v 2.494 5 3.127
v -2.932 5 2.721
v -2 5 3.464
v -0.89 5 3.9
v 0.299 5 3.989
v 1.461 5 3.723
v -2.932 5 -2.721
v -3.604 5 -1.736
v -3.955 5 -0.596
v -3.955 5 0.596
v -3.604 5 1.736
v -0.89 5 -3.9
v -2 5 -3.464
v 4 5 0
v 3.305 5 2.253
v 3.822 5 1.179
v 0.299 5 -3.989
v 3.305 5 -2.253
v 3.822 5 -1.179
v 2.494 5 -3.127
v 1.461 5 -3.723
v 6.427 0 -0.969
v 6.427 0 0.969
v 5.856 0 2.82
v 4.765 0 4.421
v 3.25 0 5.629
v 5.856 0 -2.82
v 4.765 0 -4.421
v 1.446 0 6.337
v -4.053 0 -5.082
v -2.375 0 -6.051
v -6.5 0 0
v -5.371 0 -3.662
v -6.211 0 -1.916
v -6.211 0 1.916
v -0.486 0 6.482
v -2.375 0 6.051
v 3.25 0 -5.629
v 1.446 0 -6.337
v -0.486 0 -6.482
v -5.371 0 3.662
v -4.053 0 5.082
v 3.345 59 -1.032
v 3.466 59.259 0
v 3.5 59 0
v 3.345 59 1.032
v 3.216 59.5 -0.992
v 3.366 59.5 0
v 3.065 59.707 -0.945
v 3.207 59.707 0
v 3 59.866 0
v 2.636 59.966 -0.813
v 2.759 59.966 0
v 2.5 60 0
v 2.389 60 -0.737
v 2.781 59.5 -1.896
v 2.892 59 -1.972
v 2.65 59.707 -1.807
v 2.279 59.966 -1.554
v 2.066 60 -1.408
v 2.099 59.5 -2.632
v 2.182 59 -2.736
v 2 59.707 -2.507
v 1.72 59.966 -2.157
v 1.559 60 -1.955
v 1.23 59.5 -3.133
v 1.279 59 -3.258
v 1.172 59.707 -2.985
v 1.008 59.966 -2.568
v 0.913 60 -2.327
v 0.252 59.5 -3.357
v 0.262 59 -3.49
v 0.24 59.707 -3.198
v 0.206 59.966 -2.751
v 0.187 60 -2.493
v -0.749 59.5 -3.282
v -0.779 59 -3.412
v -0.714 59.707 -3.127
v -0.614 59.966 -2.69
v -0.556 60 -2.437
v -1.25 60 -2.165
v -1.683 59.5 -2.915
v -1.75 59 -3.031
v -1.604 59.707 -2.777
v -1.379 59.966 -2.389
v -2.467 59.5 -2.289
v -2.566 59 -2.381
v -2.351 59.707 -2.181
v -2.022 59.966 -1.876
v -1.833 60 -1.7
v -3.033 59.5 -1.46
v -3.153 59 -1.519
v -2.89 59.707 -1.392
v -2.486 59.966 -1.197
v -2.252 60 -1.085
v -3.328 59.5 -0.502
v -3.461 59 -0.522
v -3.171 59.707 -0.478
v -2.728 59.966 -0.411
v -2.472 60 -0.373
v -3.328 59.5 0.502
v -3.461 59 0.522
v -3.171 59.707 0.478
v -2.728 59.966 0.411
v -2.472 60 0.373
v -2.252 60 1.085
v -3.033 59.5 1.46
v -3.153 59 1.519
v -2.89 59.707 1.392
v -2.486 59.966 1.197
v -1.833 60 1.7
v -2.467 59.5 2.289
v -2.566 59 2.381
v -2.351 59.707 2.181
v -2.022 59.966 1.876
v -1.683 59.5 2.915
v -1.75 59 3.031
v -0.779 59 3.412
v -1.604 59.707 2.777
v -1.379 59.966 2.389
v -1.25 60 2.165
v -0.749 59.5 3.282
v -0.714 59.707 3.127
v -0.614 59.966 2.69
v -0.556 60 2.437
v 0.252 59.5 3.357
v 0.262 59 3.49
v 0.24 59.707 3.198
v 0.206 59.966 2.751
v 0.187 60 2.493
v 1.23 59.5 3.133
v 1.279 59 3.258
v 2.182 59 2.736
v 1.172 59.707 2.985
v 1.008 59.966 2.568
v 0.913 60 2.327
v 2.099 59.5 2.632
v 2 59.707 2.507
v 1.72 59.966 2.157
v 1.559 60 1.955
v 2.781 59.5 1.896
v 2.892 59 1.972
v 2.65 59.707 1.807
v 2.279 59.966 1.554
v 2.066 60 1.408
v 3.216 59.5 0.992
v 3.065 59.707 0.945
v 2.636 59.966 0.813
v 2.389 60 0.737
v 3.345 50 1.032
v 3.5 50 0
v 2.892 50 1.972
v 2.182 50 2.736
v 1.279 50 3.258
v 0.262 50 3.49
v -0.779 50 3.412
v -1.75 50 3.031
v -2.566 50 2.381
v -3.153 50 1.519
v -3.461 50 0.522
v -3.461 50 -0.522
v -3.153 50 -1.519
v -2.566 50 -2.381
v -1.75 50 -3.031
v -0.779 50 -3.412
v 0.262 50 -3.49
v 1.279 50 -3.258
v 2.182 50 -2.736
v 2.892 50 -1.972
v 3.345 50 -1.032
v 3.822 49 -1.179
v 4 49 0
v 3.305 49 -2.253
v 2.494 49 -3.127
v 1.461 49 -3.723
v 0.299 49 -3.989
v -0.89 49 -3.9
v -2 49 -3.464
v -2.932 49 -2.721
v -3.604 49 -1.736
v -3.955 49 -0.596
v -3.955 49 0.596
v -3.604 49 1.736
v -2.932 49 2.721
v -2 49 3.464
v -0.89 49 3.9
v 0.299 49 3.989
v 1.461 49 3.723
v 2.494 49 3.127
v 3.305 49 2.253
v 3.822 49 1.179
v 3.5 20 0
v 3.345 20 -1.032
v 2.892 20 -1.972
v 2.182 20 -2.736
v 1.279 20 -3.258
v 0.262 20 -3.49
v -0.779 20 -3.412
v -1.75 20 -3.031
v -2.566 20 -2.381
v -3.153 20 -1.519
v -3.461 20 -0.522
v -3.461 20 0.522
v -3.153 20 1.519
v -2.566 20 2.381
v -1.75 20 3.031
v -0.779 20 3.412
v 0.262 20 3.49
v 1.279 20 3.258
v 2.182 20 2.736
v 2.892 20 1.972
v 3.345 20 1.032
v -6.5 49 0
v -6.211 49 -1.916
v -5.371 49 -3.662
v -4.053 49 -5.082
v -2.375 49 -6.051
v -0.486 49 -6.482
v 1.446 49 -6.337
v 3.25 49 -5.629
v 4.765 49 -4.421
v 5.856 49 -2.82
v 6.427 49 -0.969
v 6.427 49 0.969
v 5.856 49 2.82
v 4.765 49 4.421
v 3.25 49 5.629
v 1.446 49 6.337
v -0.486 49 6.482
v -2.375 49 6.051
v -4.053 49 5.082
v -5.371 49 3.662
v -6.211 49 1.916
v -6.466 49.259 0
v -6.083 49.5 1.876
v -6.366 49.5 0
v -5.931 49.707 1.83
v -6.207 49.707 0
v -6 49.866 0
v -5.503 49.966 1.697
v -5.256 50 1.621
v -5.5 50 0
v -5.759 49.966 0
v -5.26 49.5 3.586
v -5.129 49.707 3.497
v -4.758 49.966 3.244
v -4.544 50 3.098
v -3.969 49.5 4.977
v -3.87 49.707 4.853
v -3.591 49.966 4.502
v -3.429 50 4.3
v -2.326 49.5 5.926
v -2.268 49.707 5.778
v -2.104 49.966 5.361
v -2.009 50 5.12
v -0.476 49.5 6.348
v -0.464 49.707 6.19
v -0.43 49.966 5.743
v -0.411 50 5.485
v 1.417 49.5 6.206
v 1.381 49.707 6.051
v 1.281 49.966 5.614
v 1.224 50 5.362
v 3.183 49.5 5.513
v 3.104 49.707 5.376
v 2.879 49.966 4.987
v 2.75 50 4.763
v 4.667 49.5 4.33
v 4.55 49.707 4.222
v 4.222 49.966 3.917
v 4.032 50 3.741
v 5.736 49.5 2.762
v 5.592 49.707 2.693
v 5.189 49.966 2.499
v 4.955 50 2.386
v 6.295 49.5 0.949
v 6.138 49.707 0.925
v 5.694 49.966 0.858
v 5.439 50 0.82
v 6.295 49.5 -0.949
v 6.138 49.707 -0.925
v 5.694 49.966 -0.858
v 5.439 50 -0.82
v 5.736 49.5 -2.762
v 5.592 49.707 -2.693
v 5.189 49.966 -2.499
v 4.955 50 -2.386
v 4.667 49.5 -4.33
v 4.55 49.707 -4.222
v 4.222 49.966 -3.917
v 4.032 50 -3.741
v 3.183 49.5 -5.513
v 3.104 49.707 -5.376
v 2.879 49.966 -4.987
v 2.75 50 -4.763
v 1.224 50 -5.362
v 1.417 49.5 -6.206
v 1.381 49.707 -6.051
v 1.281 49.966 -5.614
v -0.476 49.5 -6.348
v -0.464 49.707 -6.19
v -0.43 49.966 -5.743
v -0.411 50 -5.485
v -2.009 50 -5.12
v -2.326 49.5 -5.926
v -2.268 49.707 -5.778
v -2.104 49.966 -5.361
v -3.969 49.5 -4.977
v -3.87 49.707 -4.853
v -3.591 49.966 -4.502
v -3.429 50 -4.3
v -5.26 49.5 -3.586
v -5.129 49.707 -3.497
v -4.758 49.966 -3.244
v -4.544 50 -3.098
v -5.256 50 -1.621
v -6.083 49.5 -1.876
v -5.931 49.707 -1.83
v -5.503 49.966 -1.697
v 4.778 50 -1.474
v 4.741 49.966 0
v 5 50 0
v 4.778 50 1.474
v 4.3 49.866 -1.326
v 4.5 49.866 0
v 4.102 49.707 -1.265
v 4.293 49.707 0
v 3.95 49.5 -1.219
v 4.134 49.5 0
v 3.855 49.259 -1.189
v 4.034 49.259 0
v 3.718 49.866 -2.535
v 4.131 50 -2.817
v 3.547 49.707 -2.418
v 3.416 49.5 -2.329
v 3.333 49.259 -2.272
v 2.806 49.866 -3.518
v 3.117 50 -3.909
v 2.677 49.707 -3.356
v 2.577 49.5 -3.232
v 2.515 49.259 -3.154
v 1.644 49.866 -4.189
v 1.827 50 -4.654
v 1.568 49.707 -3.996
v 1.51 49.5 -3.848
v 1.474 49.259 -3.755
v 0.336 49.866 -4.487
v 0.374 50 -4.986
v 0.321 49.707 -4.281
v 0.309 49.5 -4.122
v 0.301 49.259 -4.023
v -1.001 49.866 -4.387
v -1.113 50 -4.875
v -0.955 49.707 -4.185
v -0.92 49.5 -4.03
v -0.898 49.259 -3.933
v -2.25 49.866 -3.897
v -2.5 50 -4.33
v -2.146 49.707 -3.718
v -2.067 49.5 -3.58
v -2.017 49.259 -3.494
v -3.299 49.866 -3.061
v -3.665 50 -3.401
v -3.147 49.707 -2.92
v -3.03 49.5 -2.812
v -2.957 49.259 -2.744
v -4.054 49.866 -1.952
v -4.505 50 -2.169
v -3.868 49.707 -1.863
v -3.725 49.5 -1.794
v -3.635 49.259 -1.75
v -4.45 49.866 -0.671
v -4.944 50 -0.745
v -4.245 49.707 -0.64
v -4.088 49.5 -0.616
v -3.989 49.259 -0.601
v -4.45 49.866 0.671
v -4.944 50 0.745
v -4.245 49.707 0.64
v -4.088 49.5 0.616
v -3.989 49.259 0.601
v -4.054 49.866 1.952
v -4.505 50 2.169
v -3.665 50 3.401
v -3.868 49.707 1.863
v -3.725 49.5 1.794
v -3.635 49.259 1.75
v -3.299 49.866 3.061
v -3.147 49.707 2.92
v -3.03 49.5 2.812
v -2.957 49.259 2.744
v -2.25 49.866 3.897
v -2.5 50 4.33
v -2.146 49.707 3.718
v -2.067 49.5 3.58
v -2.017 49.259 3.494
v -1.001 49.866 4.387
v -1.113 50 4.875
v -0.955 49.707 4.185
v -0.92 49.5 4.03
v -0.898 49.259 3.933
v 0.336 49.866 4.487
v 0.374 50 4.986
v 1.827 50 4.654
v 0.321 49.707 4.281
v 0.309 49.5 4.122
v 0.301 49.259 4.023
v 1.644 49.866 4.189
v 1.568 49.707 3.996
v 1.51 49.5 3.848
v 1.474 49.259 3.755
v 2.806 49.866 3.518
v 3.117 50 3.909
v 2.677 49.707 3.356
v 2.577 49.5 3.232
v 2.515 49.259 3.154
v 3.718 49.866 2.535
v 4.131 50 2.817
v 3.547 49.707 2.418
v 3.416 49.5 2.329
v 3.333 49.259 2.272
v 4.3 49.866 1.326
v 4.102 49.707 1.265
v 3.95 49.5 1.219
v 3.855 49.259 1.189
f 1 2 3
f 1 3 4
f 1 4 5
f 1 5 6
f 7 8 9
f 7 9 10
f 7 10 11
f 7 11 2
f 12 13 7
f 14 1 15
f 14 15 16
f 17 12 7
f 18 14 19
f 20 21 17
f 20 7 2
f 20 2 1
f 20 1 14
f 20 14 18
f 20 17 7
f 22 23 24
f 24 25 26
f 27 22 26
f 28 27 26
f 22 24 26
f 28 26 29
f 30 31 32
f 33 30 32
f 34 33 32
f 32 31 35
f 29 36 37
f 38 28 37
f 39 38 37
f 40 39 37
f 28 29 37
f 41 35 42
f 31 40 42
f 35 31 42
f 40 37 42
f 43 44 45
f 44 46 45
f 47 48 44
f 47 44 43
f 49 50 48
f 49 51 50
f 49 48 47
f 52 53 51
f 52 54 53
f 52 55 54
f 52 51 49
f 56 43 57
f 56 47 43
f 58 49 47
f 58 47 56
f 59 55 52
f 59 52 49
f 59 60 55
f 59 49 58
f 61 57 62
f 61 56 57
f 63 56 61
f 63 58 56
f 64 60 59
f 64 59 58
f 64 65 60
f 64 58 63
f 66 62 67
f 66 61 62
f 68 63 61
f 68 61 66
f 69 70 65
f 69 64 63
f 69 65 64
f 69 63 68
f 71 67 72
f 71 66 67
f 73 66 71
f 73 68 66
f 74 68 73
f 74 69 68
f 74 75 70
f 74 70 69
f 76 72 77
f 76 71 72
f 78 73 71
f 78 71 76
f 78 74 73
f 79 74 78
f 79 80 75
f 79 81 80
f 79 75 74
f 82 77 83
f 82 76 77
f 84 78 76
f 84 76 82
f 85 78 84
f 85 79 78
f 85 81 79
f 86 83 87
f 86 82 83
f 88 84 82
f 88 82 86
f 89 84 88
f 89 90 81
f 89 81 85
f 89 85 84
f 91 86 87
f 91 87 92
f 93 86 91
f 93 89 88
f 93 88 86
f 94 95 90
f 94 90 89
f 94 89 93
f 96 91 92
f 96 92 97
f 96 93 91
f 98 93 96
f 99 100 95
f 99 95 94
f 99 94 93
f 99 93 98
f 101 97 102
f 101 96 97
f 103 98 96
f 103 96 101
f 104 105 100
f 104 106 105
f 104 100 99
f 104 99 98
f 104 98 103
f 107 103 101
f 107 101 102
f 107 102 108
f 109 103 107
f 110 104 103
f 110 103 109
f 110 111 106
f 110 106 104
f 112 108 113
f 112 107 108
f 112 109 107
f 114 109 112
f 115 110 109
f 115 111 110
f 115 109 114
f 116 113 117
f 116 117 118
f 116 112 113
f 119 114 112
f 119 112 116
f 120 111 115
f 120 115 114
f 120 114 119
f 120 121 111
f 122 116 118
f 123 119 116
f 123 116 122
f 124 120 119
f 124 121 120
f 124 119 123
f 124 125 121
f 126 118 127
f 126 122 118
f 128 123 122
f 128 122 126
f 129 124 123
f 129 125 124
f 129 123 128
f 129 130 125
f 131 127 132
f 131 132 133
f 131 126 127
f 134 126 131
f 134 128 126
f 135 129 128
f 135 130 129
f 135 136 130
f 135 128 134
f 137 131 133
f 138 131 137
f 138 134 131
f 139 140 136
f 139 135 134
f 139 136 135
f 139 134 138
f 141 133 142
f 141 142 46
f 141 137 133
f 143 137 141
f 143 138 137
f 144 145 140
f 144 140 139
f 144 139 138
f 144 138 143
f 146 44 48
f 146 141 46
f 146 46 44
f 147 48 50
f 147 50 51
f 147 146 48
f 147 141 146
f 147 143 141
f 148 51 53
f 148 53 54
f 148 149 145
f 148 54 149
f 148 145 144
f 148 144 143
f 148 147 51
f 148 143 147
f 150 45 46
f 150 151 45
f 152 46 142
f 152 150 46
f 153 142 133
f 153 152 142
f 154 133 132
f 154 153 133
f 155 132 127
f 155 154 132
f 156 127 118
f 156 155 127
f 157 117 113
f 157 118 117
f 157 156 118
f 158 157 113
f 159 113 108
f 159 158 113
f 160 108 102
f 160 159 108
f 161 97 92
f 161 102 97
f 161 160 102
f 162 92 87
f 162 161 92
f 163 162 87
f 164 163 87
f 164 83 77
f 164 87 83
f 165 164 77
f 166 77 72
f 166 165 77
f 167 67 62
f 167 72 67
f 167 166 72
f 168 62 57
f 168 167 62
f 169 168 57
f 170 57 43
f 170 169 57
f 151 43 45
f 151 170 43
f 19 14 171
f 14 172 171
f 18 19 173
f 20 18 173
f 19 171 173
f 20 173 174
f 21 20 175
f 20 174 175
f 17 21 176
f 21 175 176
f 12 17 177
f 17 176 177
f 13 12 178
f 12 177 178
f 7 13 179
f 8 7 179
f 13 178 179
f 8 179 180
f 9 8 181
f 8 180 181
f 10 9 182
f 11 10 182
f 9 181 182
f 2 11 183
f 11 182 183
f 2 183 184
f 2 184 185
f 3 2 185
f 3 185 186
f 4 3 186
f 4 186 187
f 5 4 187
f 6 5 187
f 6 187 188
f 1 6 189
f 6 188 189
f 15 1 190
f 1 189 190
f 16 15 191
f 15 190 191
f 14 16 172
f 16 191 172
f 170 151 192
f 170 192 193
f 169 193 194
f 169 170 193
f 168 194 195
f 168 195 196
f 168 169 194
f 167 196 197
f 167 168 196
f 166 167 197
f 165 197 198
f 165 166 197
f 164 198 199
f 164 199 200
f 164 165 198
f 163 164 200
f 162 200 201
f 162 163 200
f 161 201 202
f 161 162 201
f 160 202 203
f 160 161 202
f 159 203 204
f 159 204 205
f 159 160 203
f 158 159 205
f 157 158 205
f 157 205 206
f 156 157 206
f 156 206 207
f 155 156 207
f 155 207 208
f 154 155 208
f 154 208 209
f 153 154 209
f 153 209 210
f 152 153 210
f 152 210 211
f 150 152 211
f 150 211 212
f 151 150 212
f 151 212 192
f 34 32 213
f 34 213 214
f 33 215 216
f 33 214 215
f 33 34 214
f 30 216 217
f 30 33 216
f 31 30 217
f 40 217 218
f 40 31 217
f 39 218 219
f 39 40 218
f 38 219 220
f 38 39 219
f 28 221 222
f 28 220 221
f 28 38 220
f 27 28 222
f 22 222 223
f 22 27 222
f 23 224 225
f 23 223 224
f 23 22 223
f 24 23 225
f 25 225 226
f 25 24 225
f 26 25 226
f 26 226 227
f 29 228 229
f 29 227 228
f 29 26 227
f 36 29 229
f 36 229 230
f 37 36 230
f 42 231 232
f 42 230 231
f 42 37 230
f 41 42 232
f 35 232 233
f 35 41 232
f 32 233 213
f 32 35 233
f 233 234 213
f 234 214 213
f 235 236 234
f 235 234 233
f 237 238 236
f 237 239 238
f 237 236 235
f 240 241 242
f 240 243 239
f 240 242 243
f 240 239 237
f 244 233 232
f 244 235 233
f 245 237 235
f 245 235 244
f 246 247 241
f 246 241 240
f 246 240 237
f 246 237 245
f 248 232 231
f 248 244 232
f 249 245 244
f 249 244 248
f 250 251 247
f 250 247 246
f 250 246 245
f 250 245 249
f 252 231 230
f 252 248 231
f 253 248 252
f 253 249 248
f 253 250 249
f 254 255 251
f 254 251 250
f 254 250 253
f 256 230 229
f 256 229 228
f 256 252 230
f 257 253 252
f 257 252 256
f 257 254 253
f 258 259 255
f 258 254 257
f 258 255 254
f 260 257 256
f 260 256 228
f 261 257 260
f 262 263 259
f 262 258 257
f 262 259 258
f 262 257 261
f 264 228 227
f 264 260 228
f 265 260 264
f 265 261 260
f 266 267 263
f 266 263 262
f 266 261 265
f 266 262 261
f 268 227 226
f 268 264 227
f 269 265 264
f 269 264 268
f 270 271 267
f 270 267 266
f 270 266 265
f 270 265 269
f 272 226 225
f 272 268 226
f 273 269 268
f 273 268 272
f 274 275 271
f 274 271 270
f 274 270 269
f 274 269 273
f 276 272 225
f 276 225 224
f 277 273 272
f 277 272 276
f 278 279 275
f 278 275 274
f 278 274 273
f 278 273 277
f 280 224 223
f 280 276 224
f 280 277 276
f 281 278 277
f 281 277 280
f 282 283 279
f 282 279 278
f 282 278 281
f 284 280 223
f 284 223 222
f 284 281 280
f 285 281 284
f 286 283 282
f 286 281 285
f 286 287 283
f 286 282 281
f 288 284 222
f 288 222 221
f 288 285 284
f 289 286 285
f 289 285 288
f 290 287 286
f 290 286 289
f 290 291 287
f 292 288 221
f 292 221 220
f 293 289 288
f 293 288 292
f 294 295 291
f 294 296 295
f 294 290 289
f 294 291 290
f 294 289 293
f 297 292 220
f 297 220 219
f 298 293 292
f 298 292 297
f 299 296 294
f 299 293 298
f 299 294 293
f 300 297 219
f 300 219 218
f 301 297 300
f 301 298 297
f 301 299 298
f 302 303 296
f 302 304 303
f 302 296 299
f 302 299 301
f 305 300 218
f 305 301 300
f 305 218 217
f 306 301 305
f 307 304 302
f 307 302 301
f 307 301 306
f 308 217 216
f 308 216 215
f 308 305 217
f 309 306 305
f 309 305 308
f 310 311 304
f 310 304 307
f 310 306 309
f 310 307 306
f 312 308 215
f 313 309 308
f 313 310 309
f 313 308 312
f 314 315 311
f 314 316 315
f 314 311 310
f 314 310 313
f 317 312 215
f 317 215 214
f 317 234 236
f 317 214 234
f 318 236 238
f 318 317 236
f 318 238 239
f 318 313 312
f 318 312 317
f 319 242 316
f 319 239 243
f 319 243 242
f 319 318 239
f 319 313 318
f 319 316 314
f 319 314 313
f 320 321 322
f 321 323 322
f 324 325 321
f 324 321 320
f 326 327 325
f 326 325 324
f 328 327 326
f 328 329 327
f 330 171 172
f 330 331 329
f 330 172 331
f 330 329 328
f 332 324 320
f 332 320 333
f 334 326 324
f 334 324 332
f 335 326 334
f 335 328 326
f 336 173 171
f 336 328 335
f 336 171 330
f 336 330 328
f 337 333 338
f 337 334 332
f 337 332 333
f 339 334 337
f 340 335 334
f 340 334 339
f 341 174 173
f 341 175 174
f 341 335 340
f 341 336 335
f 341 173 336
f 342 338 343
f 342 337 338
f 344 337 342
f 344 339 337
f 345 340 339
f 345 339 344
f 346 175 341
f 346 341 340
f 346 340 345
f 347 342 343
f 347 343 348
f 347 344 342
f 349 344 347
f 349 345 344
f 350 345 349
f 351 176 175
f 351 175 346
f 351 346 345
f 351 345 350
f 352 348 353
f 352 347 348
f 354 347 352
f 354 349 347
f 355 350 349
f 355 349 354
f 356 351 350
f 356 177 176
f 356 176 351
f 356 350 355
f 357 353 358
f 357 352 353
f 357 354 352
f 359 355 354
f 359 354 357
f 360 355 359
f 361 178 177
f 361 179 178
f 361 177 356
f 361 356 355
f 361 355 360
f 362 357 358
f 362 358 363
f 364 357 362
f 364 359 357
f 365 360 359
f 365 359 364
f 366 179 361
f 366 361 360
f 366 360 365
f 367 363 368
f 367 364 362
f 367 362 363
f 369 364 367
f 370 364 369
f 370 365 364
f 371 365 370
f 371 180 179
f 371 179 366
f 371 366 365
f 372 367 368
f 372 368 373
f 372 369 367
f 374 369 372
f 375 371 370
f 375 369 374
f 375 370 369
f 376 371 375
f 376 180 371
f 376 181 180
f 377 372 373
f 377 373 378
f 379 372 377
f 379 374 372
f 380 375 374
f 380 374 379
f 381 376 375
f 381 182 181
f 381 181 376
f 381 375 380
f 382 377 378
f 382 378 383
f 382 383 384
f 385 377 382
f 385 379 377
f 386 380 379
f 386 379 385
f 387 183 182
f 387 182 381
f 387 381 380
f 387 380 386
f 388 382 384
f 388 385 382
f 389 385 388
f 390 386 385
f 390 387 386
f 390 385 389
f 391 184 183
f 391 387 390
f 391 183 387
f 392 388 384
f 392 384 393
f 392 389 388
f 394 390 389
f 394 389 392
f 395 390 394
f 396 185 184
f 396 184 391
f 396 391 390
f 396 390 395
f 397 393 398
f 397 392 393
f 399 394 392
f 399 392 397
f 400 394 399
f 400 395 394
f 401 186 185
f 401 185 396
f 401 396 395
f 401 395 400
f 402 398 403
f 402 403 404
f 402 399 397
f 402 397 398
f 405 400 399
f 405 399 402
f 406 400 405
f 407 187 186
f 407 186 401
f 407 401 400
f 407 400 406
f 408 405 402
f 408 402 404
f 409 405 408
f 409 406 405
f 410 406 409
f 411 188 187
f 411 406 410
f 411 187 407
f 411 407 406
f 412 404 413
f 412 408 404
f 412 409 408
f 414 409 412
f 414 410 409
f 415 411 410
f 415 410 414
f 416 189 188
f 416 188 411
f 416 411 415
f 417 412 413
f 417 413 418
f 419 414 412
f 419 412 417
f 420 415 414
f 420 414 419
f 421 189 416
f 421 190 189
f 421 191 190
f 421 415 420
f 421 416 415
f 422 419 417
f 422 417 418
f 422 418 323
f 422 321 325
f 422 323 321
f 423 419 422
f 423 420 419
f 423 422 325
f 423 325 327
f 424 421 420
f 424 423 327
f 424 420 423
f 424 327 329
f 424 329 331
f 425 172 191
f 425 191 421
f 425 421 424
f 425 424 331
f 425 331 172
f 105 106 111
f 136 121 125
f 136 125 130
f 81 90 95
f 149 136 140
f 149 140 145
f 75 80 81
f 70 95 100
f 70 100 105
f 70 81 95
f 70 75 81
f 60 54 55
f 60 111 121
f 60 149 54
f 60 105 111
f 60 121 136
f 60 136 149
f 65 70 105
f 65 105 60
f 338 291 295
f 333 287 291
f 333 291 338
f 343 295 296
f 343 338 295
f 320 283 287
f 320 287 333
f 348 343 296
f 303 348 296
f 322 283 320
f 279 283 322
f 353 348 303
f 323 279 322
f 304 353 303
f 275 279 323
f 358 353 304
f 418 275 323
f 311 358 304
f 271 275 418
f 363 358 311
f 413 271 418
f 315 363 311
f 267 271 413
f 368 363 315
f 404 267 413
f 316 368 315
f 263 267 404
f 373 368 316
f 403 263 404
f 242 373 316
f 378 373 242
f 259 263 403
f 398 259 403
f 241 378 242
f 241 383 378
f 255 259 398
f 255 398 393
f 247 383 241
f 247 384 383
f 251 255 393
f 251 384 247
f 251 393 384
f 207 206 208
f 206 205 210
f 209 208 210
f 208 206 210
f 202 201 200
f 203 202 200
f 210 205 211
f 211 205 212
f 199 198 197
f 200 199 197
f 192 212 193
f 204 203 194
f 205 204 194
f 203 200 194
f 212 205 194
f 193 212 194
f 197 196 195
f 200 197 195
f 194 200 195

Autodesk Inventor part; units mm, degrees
ref_plane "YZ Plane" through (0, 0, 0) normal (1, 0, 0) x (0, 1, 0)
ref_plane "XZ Plane" through (0, 0, 0) normal (0, 1, 0) x (-1, 0, 0)
ref_plane "XY Plane" through (0, 0, 0) normal (0, 0, 1) x (1, 0, 0)
sketch "스케치1" plane through (0, 0, 0) normal (0, 1, 0) x (-1, 0, 0)
  circle A0 centre (0, 0) radius 6.5
  dimension "d0" = 13
extrude "돌출1" add sketch "스케치1" along normal blind 50
sketch "스케치2" plane through (0, 50, 0) normal (0, 1, 0) x (1, 0, 0)
  circle A0 centre (0, 0) radius 4
  dimension "d3" = 8
extrude "돌출2" cut sketch "스케치2" against normal blind 45
sketch "스케치4" plane through (0, 50, 0) normal (0, 1, 0) x (1, 0, 0)
  circle A0 centre (0, 0) radius 3.5
  dimension "d6" = 7
extrude "돌출3" add sketch "스케치4" along normal blind 10 and the other way blind 30
fillet "모깎기1" radius 1 3 edges at (-4, 50, 0) (6.5, 50, 0) (-3.5, 60, 0)
sketch "스케치5" plane through (0, 60, 0) normal (0, 1, 0) x (1, 0, 0)
  point P0 (0, 0)
properties part number "fan_num2"
